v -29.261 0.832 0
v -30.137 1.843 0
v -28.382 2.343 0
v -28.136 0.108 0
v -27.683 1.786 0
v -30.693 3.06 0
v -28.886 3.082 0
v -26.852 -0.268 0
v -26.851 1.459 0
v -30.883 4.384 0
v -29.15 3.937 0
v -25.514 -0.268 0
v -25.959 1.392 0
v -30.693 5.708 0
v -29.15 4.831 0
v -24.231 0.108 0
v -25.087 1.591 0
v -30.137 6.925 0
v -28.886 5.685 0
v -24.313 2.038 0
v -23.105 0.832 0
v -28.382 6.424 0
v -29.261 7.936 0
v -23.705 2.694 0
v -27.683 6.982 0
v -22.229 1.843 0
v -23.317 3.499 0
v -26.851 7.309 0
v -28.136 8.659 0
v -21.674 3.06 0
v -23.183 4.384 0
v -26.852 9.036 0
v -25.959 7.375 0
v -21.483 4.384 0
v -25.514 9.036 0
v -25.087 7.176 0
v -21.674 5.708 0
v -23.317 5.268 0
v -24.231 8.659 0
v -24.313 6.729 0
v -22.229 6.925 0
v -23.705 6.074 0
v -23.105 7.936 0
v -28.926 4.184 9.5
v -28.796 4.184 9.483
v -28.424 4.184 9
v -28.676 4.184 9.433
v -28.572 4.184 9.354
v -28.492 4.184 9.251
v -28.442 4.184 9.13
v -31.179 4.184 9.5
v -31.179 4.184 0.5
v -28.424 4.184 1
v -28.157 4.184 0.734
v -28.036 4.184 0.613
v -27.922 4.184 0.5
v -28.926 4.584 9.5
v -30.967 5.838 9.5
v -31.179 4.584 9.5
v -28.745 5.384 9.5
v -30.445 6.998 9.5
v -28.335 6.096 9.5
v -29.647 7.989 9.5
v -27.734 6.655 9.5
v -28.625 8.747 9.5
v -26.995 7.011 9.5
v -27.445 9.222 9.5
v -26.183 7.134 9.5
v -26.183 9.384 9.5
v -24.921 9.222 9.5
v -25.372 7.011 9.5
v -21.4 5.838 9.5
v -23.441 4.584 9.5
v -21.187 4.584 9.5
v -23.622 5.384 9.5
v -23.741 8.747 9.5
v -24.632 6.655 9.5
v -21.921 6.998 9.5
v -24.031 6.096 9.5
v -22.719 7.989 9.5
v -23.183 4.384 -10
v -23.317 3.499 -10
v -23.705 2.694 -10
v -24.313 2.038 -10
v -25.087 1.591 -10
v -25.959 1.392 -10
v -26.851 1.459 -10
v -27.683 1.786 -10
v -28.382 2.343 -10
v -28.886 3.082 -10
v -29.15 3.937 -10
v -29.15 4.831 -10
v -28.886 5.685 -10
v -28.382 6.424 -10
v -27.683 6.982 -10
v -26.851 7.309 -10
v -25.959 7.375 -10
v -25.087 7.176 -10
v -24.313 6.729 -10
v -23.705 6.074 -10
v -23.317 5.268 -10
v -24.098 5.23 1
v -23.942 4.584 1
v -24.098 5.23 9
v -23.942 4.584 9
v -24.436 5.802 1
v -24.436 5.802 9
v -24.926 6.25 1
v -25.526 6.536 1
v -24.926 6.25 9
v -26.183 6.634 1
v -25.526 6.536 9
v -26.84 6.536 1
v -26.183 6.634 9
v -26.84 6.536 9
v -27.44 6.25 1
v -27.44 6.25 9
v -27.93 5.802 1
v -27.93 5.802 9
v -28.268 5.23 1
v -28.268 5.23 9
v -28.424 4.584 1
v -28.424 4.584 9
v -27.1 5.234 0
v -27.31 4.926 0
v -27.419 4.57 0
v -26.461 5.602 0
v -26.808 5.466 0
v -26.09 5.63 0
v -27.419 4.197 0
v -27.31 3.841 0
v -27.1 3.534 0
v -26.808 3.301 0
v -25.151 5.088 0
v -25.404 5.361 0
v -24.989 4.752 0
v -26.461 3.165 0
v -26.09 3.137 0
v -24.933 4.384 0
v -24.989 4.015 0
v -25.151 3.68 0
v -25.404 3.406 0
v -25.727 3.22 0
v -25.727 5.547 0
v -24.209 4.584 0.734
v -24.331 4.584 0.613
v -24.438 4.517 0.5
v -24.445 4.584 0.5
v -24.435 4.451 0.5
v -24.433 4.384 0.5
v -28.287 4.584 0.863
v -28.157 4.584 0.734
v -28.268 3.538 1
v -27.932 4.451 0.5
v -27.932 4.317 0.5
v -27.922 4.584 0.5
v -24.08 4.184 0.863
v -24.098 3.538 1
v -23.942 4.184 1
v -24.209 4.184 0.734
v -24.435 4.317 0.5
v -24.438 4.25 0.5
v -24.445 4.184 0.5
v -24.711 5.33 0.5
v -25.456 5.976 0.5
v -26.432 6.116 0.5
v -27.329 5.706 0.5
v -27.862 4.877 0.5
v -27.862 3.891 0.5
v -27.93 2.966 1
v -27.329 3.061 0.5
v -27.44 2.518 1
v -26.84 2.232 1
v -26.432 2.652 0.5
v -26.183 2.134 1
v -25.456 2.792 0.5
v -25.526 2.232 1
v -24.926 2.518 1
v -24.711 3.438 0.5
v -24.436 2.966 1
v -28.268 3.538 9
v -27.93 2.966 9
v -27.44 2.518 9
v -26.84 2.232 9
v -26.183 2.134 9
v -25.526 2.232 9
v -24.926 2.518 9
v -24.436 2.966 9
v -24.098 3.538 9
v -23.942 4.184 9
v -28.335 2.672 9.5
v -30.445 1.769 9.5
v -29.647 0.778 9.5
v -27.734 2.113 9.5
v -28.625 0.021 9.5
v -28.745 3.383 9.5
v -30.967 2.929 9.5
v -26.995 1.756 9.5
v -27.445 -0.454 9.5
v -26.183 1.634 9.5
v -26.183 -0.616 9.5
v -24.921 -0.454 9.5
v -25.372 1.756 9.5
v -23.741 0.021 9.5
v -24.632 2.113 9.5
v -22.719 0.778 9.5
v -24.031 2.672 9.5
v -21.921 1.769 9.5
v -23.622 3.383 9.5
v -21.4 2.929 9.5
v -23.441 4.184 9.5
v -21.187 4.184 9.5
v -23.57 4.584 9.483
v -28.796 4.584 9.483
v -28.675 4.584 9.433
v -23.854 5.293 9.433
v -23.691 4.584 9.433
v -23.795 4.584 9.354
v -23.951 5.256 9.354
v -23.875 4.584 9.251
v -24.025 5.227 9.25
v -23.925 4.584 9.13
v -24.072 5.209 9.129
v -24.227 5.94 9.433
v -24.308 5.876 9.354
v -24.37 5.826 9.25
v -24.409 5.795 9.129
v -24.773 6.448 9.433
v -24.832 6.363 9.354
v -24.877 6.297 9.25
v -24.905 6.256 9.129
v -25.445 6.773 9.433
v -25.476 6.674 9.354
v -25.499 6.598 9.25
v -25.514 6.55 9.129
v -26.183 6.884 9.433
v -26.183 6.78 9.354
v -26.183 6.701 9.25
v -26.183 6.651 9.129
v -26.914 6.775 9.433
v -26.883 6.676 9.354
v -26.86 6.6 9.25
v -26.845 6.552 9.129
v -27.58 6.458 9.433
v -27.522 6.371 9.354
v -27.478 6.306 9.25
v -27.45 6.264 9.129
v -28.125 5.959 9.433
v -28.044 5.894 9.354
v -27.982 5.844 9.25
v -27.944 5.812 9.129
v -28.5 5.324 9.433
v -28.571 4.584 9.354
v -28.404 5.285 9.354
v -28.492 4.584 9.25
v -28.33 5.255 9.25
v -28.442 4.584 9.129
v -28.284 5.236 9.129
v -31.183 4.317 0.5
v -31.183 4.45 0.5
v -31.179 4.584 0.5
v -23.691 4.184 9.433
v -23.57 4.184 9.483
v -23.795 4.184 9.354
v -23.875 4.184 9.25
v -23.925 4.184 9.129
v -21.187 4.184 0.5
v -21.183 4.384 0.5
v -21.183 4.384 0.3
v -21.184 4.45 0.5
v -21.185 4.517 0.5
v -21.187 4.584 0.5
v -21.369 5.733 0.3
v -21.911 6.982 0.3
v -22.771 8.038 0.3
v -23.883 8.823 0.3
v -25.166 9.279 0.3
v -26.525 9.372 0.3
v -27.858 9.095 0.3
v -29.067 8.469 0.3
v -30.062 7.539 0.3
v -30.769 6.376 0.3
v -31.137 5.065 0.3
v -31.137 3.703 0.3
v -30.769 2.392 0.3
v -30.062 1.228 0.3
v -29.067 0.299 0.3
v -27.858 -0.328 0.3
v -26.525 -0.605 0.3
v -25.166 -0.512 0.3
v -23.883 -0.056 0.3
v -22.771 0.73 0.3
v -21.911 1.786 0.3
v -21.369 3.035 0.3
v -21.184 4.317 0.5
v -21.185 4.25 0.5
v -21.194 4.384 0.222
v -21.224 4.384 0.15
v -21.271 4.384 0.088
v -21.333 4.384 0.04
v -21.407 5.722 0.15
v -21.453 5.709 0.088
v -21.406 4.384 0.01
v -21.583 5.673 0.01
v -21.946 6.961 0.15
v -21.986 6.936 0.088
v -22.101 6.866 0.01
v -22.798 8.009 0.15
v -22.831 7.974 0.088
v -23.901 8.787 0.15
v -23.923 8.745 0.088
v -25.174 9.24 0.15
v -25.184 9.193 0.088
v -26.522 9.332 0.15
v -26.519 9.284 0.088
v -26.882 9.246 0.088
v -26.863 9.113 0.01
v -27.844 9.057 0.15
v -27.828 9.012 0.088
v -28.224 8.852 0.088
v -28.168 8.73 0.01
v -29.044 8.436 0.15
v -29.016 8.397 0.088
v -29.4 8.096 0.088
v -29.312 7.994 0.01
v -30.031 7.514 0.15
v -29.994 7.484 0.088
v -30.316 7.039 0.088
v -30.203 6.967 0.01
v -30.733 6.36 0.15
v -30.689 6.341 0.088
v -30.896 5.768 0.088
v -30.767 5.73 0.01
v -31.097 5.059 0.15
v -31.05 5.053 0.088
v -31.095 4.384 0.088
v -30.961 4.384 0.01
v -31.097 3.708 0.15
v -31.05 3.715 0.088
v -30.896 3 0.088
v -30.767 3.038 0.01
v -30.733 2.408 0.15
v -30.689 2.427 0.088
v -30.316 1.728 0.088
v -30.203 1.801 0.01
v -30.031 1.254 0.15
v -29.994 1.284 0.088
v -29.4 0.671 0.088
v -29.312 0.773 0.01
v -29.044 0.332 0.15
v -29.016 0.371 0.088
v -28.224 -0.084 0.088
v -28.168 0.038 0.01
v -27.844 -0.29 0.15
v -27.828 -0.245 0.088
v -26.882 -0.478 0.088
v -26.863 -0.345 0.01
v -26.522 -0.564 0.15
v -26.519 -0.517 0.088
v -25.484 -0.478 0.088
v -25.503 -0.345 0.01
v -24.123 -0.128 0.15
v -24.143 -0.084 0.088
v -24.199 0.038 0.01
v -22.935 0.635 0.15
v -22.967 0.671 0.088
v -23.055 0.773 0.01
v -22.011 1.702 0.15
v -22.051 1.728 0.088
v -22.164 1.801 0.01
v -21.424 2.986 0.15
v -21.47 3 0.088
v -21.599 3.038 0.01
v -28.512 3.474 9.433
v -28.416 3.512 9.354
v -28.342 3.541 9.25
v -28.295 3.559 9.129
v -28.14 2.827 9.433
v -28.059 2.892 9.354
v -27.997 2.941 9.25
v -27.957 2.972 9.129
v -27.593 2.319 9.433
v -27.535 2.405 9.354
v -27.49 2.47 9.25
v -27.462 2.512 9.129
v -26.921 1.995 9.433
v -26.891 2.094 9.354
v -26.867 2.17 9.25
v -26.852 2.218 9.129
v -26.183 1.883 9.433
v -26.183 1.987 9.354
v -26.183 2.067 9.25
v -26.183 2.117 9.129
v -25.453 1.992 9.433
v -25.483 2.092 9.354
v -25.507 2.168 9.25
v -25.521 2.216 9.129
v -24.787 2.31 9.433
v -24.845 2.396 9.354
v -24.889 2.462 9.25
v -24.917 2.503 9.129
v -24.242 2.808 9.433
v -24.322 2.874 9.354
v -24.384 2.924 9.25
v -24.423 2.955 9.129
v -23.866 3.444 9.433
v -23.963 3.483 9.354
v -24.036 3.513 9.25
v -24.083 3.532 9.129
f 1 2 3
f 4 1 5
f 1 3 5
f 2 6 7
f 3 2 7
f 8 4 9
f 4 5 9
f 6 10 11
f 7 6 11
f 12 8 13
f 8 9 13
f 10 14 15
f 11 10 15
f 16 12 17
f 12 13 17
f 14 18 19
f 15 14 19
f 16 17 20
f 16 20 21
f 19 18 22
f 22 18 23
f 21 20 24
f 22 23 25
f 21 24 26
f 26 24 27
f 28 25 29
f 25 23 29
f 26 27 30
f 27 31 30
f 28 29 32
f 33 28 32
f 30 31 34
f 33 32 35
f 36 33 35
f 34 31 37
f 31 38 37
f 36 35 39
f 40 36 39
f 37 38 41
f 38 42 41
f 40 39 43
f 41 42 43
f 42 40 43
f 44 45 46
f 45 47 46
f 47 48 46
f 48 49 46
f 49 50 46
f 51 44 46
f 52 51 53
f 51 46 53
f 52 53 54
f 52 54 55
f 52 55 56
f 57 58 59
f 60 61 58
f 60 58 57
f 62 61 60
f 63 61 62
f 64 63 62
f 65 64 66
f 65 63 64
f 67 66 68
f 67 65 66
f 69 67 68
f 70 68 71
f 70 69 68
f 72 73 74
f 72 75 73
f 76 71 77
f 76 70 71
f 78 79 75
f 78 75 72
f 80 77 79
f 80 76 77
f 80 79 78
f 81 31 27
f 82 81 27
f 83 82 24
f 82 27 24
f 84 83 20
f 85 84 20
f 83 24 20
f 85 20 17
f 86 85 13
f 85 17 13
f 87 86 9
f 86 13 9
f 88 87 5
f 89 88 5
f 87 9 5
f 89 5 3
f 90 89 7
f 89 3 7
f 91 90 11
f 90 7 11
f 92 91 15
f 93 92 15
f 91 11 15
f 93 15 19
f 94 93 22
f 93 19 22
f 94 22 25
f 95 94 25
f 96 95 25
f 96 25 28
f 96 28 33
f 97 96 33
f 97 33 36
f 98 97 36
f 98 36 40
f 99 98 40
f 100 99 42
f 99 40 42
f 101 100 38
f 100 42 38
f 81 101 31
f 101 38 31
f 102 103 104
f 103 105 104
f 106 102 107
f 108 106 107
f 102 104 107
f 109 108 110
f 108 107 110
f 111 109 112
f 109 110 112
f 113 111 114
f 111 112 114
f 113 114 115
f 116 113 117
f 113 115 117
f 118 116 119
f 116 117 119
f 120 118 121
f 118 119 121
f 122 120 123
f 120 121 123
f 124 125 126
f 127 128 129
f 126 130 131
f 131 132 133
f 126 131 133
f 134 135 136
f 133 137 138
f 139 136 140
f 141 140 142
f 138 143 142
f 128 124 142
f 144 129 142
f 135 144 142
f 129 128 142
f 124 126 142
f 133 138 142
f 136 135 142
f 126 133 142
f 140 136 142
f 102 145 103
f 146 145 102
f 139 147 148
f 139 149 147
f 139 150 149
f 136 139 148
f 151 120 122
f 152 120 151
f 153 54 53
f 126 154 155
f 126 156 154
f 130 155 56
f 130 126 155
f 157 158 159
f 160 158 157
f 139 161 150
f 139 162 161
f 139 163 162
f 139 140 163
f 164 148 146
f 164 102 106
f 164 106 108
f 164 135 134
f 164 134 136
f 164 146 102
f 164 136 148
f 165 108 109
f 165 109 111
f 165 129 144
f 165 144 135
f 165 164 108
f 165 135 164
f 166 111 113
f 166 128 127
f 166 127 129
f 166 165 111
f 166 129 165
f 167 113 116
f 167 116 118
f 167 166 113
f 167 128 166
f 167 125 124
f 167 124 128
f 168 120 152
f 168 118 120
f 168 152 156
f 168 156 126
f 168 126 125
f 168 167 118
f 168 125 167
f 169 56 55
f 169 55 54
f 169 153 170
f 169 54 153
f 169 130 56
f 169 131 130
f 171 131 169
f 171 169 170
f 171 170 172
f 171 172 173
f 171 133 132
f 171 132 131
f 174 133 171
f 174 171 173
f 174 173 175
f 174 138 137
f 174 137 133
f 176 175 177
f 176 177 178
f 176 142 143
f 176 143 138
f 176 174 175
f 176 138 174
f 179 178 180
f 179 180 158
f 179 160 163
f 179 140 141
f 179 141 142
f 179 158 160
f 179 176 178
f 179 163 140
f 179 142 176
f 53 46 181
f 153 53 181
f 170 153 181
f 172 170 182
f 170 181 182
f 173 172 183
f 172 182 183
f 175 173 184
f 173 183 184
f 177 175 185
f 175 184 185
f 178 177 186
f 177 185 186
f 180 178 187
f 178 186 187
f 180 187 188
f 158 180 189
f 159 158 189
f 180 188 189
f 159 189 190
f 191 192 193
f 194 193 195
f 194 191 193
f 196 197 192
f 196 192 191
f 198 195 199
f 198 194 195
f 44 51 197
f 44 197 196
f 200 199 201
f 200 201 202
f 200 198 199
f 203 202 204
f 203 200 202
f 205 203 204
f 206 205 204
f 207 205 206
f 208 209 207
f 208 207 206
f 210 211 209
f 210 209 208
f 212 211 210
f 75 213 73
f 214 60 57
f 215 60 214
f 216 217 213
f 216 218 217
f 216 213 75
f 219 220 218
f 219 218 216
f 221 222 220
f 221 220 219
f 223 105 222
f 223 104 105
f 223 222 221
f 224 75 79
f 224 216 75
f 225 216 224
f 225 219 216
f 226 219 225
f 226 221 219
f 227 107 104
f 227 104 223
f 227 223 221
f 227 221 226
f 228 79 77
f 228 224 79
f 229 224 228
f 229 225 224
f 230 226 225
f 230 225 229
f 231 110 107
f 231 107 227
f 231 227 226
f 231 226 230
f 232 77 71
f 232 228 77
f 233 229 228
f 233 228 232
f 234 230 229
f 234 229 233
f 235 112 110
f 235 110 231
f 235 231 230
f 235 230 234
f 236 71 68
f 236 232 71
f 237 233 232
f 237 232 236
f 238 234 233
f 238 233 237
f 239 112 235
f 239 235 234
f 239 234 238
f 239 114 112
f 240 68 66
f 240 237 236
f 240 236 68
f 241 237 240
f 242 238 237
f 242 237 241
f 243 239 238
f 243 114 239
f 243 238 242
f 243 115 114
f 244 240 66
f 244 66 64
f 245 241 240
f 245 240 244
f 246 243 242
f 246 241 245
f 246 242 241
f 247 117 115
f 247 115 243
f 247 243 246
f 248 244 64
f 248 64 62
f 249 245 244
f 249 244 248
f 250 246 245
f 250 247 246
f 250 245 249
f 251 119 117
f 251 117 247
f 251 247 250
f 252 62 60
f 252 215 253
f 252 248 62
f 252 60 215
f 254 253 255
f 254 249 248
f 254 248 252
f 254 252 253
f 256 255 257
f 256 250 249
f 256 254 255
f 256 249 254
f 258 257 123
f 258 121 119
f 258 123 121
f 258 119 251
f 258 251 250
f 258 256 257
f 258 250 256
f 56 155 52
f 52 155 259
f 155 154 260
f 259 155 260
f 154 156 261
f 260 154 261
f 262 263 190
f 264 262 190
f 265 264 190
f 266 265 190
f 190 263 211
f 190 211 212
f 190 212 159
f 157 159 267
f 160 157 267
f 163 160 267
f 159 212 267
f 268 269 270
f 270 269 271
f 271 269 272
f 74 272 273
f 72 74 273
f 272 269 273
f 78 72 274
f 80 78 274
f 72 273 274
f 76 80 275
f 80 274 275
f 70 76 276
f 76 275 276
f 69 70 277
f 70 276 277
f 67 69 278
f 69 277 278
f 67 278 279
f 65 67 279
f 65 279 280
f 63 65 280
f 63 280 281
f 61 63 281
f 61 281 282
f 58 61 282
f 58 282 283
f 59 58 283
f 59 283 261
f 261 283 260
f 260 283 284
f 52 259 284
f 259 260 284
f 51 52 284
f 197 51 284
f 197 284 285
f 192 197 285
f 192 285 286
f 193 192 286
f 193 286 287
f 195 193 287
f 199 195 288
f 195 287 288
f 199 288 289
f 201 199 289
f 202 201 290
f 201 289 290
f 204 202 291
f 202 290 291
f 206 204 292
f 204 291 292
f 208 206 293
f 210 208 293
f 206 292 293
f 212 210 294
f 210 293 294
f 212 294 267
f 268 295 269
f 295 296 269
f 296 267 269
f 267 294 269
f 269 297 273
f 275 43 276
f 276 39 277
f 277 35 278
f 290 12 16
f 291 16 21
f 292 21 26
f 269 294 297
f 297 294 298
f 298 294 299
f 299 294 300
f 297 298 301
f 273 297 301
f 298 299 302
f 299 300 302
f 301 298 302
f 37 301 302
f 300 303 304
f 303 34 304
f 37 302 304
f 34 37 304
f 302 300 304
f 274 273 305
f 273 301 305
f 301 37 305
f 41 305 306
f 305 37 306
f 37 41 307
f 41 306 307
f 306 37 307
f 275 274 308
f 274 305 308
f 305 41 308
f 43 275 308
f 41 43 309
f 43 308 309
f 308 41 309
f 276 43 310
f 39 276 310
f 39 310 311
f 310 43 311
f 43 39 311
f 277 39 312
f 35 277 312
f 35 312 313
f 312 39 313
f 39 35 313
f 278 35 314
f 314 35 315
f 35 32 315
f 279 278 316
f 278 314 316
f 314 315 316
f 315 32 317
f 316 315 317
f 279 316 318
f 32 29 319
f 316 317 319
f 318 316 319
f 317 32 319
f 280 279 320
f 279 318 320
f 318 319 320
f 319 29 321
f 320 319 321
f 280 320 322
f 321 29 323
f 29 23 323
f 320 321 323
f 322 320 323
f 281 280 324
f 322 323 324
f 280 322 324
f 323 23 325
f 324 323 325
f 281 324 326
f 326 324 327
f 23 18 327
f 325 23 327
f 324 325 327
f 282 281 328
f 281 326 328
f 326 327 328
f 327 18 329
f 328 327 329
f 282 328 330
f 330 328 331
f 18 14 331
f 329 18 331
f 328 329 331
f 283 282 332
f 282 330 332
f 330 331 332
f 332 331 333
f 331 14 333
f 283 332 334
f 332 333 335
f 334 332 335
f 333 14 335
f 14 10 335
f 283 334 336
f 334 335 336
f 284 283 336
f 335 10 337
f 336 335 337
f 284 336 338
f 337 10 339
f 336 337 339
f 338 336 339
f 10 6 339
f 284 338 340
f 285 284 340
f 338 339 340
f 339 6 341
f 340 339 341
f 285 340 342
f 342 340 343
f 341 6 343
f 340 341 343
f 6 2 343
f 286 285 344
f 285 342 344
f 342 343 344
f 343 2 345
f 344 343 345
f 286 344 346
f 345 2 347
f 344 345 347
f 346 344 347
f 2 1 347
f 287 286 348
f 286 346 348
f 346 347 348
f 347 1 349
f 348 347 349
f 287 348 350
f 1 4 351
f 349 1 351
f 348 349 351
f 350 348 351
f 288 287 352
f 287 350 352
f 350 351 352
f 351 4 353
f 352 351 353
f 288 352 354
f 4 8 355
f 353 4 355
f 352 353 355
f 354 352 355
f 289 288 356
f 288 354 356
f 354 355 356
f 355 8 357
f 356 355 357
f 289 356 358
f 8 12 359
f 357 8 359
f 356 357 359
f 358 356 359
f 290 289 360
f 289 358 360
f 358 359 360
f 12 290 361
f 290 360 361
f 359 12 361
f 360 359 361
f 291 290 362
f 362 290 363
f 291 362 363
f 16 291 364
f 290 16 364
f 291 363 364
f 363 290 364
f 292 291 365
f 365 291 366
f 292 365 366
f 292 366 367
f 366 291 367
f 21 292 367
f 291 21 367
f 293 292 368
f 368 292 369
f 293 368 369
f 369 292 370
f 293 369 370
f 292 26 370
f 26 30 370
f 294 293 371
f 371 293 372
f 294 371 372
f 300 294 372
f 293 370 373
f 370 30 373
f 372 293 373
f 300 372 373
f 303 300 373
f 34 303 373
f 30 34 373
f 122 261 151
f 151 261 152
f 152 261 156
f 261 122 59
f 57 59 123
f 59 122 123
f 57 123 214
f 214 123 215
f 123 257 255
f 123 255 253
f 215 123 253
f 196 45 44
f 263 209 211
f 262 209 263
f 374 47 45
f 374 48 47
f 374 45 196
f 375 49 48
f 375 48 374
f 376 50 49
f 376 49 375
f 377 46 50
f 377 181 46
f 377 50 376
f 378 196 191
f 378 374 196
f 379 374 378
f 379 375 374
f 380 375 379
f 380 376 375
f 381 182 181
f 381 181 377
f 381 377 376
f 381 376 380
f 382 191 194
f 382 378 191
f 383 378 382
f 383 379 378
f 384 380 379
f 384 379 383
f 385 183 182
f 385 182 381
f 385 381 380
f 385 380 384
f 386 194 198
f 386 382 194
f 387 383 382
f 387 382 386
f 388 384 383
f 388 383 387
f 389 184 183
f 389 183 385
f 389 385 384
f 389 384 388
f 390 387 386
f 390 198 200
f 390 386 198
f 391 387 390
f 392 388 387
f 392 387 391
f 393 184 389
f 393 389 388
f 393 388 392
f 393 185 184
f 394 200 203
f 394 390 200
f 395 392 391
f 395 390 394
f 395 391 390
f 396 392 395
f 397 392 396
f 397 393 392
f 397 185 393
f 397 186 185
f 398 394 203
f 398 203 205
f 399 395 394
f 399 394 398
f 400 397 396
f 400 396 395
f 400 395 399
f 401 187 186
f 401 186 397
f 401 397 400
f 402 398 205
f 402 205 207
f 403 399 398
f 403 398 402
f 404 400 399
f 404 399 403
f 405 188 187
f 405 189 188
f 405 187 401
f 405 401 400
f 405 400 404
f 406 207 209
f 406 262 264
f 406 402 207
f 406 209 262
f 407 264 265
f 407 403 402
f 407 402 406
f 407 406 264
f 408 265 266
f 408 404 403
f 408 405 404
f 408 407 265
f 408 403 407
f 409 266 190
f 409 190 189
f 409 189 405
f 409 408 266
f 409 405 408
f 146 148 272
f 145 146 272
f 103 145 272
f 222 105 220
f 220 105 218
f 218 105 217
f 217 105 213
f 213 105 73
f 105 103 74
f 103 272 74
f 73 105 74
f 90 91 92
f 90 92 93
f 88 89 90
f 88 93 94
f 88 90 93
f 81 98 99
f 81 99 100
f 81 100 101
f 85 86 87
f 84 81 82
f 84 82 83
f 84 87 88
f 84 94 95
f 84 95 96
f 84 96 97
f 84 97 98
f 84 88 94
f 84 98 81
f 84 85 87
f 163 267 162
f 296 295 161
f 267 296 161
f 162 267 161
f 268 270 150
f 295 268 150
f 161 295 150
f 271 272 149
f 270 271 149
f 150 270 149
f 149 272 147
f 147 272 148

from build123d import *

# Parameters (mm, degrees)
ESBO_O1_R                = 5
RESSALTO_EXTRUS_O1_DEPTH = 9.5
ESBO_O2_R                = 2.25
CORTE_EXTRUS_O1_DEPTH    = 11
ESBO_O3_R                = 3
RESSALTO_EXTRUS_O2_DEPTH = 10
CORTE_EXTRUS_O2_DEPTH    = 9
FILETE1_R                = 0.5
FILETE2_R                = 0.3
CHANFRO1_SIZE            = 1


with BuildPart() as part:
    # Esboço1 → Ressalto-extrusão1 (new body)
    with BuildSketch(Plane.XY):
        with Locations((-26.183327478, 4.383756345)):
            Circle(ESBO_O1_R)
    extrude(amount=RESSALTO_EXTRUS_O1_DEPTH)

    # Esboço2 → Corte-extrusão1 (cut)
    with BuildSketch(Plane.XY.offset(9.5)):
        with Locations((-26.183327478, 4.383756345)):
            Circle(ESBO_O2_R)
    extrude(amount=-CORTE_EXTRUS_O1_DEPTH, mode=Mode.SUBTRACT)

    # Esboço3 → Ressalto-extrusão2 (add)
    with BuildSketch(Plane(origin=(0, 0, 0), x_dir=(-1, 0, 0), z_dir=(0, 0, -1))):
        with Locations(Location((26.183327478, 4.383756345, 0), (0, 0, 180))):
            Circle(ESBO_O3_R)
    extrude(amount=RESSALTO_EXTRUS_O2_DEPTH)

    # Esboço4 → Corte-extrusão2 (cut)
    with BuildSketch(Plane.XY.offset(9.5)):
        with BuildLine():
            Line((-31.183327478, 4.583756345), (-21.183327478, 4.583756345))
            ThreePointArc((-21.183327478, 4.583756345), (-20.983327478, 4.383756345), (-21.183327478, 4.183756345))
            Line((-21.183327478, 4.183756345), (-31.183327478, 4.183756345))
            ThreePointArc((-31.183327478, 4.183756345), (-31.383327478, 4.383756345), (-31.183327478, 4.583756345))
        make_face()
    extrude(amount=-CORTE_EXTRUS_O2_DEPTH, mode=Mode.SUBTRACT)

    # Filete1
    filete1_edges = [part.edges().sort_by_distance(p)[0] for p in [
        (-26.183327478, 2.133756345, 9.5),
        (-26.183327478, 6.633756345, 9.5),
    ]]
    fillet(filete1_edges, radius=FILETE1_R)

    # Filete2
    filete2_edges = [part.edges().sort_by_distance(p)[0] for p in [
        (-31.183327478, 4.383756345, 0),
    ]]
    fillet(filete2_edges, radius=FILETE2_R)

    # Chanfro1
    # the kernel refuses this chamfer: 1 mm, written as the material it adds along each edge
    with BuildSketch(Plane(origin=(-26.183327478, 4.383756345, 0), x_dir=(1, 0, 0), z_dir=(0, -1, 0))) as chanfro1_piece_1_section:
        Polygon((2.25, CHANFRO1_SIZE), (2.25 - CHANFRO1_SIZE, 0), (2.25, 0), align=None)
    chanfro1_piece_1 = revolve(axis=Axis((-26.183327478, 4.383756345, 0), (0, 0, 1)), mode=Mode.PRIVATE)
    chanfro1_piece_1 = split(chanfro1_piece_1, bisect_by=Plane(origin=(-24.32601133, 4.383756345, 0.5), z_dir=(0, 0, -1)), keep=Keep.TOP, mode=Mode.PRIVATE)
    add(chanfro1_piece_1)
    with BuildSketch(Plane(origin=(-26.183327478, 4.383756345, 0), x_dir=(1, 0, 0), z_dir=(0, -1, 0))) as chanfro1_piece_2_section:
        Polygon((2.25, CHANFRO1_SIZE), (2.25 - CHANFRO1_SIZE, 0), (2.25, 0), align=None)
    chanfro1_piece_2 = revolve(axis=Axis((-26.183327478, 4.383756345, 0), (0, 0, 1)), mode=Mode.PRIVATE)
    chanfro1_piece_2 = split(chanfro1_piece_2, bisect_by=Plane(origin=(-26.183327478, 4.583756345, 0.743524391), z_dir=(0, 1, 0)), keep=Keep.TOP, mode=Mode.PRIVATE)
    add(chanfro1_piece_2)
    with BuildSketch(Plane(origin=(-26.183327478, 4.383756345, 0), x_dir=(1, 0, 0), z_dir=(0, -1, 0))) as chanfro1_piece_3_section:
        Polygon((2.25, CHANFRO1_SIZE), (2.25 - CHANFRO1_SIZE, 0), (2.25, 0), align=None)
    chanfro1_piece_3 = revolve(axis=Axis((-26.183327478, 4.383756345, 0), (0, 0, 1)), mode=Mode.PRIVATE)
    chanfro1_piece_3 = split(chanfro1_piece_3, bisect_by=Plane(origin=(-26.183327478, 4.183756345, 0.743524391), z_dir=(0, -1, 0)), keep=Keep.TOP, mode=Mode.PRIVATE)
    add(chanfro1_piece_3)


solid = part.part
